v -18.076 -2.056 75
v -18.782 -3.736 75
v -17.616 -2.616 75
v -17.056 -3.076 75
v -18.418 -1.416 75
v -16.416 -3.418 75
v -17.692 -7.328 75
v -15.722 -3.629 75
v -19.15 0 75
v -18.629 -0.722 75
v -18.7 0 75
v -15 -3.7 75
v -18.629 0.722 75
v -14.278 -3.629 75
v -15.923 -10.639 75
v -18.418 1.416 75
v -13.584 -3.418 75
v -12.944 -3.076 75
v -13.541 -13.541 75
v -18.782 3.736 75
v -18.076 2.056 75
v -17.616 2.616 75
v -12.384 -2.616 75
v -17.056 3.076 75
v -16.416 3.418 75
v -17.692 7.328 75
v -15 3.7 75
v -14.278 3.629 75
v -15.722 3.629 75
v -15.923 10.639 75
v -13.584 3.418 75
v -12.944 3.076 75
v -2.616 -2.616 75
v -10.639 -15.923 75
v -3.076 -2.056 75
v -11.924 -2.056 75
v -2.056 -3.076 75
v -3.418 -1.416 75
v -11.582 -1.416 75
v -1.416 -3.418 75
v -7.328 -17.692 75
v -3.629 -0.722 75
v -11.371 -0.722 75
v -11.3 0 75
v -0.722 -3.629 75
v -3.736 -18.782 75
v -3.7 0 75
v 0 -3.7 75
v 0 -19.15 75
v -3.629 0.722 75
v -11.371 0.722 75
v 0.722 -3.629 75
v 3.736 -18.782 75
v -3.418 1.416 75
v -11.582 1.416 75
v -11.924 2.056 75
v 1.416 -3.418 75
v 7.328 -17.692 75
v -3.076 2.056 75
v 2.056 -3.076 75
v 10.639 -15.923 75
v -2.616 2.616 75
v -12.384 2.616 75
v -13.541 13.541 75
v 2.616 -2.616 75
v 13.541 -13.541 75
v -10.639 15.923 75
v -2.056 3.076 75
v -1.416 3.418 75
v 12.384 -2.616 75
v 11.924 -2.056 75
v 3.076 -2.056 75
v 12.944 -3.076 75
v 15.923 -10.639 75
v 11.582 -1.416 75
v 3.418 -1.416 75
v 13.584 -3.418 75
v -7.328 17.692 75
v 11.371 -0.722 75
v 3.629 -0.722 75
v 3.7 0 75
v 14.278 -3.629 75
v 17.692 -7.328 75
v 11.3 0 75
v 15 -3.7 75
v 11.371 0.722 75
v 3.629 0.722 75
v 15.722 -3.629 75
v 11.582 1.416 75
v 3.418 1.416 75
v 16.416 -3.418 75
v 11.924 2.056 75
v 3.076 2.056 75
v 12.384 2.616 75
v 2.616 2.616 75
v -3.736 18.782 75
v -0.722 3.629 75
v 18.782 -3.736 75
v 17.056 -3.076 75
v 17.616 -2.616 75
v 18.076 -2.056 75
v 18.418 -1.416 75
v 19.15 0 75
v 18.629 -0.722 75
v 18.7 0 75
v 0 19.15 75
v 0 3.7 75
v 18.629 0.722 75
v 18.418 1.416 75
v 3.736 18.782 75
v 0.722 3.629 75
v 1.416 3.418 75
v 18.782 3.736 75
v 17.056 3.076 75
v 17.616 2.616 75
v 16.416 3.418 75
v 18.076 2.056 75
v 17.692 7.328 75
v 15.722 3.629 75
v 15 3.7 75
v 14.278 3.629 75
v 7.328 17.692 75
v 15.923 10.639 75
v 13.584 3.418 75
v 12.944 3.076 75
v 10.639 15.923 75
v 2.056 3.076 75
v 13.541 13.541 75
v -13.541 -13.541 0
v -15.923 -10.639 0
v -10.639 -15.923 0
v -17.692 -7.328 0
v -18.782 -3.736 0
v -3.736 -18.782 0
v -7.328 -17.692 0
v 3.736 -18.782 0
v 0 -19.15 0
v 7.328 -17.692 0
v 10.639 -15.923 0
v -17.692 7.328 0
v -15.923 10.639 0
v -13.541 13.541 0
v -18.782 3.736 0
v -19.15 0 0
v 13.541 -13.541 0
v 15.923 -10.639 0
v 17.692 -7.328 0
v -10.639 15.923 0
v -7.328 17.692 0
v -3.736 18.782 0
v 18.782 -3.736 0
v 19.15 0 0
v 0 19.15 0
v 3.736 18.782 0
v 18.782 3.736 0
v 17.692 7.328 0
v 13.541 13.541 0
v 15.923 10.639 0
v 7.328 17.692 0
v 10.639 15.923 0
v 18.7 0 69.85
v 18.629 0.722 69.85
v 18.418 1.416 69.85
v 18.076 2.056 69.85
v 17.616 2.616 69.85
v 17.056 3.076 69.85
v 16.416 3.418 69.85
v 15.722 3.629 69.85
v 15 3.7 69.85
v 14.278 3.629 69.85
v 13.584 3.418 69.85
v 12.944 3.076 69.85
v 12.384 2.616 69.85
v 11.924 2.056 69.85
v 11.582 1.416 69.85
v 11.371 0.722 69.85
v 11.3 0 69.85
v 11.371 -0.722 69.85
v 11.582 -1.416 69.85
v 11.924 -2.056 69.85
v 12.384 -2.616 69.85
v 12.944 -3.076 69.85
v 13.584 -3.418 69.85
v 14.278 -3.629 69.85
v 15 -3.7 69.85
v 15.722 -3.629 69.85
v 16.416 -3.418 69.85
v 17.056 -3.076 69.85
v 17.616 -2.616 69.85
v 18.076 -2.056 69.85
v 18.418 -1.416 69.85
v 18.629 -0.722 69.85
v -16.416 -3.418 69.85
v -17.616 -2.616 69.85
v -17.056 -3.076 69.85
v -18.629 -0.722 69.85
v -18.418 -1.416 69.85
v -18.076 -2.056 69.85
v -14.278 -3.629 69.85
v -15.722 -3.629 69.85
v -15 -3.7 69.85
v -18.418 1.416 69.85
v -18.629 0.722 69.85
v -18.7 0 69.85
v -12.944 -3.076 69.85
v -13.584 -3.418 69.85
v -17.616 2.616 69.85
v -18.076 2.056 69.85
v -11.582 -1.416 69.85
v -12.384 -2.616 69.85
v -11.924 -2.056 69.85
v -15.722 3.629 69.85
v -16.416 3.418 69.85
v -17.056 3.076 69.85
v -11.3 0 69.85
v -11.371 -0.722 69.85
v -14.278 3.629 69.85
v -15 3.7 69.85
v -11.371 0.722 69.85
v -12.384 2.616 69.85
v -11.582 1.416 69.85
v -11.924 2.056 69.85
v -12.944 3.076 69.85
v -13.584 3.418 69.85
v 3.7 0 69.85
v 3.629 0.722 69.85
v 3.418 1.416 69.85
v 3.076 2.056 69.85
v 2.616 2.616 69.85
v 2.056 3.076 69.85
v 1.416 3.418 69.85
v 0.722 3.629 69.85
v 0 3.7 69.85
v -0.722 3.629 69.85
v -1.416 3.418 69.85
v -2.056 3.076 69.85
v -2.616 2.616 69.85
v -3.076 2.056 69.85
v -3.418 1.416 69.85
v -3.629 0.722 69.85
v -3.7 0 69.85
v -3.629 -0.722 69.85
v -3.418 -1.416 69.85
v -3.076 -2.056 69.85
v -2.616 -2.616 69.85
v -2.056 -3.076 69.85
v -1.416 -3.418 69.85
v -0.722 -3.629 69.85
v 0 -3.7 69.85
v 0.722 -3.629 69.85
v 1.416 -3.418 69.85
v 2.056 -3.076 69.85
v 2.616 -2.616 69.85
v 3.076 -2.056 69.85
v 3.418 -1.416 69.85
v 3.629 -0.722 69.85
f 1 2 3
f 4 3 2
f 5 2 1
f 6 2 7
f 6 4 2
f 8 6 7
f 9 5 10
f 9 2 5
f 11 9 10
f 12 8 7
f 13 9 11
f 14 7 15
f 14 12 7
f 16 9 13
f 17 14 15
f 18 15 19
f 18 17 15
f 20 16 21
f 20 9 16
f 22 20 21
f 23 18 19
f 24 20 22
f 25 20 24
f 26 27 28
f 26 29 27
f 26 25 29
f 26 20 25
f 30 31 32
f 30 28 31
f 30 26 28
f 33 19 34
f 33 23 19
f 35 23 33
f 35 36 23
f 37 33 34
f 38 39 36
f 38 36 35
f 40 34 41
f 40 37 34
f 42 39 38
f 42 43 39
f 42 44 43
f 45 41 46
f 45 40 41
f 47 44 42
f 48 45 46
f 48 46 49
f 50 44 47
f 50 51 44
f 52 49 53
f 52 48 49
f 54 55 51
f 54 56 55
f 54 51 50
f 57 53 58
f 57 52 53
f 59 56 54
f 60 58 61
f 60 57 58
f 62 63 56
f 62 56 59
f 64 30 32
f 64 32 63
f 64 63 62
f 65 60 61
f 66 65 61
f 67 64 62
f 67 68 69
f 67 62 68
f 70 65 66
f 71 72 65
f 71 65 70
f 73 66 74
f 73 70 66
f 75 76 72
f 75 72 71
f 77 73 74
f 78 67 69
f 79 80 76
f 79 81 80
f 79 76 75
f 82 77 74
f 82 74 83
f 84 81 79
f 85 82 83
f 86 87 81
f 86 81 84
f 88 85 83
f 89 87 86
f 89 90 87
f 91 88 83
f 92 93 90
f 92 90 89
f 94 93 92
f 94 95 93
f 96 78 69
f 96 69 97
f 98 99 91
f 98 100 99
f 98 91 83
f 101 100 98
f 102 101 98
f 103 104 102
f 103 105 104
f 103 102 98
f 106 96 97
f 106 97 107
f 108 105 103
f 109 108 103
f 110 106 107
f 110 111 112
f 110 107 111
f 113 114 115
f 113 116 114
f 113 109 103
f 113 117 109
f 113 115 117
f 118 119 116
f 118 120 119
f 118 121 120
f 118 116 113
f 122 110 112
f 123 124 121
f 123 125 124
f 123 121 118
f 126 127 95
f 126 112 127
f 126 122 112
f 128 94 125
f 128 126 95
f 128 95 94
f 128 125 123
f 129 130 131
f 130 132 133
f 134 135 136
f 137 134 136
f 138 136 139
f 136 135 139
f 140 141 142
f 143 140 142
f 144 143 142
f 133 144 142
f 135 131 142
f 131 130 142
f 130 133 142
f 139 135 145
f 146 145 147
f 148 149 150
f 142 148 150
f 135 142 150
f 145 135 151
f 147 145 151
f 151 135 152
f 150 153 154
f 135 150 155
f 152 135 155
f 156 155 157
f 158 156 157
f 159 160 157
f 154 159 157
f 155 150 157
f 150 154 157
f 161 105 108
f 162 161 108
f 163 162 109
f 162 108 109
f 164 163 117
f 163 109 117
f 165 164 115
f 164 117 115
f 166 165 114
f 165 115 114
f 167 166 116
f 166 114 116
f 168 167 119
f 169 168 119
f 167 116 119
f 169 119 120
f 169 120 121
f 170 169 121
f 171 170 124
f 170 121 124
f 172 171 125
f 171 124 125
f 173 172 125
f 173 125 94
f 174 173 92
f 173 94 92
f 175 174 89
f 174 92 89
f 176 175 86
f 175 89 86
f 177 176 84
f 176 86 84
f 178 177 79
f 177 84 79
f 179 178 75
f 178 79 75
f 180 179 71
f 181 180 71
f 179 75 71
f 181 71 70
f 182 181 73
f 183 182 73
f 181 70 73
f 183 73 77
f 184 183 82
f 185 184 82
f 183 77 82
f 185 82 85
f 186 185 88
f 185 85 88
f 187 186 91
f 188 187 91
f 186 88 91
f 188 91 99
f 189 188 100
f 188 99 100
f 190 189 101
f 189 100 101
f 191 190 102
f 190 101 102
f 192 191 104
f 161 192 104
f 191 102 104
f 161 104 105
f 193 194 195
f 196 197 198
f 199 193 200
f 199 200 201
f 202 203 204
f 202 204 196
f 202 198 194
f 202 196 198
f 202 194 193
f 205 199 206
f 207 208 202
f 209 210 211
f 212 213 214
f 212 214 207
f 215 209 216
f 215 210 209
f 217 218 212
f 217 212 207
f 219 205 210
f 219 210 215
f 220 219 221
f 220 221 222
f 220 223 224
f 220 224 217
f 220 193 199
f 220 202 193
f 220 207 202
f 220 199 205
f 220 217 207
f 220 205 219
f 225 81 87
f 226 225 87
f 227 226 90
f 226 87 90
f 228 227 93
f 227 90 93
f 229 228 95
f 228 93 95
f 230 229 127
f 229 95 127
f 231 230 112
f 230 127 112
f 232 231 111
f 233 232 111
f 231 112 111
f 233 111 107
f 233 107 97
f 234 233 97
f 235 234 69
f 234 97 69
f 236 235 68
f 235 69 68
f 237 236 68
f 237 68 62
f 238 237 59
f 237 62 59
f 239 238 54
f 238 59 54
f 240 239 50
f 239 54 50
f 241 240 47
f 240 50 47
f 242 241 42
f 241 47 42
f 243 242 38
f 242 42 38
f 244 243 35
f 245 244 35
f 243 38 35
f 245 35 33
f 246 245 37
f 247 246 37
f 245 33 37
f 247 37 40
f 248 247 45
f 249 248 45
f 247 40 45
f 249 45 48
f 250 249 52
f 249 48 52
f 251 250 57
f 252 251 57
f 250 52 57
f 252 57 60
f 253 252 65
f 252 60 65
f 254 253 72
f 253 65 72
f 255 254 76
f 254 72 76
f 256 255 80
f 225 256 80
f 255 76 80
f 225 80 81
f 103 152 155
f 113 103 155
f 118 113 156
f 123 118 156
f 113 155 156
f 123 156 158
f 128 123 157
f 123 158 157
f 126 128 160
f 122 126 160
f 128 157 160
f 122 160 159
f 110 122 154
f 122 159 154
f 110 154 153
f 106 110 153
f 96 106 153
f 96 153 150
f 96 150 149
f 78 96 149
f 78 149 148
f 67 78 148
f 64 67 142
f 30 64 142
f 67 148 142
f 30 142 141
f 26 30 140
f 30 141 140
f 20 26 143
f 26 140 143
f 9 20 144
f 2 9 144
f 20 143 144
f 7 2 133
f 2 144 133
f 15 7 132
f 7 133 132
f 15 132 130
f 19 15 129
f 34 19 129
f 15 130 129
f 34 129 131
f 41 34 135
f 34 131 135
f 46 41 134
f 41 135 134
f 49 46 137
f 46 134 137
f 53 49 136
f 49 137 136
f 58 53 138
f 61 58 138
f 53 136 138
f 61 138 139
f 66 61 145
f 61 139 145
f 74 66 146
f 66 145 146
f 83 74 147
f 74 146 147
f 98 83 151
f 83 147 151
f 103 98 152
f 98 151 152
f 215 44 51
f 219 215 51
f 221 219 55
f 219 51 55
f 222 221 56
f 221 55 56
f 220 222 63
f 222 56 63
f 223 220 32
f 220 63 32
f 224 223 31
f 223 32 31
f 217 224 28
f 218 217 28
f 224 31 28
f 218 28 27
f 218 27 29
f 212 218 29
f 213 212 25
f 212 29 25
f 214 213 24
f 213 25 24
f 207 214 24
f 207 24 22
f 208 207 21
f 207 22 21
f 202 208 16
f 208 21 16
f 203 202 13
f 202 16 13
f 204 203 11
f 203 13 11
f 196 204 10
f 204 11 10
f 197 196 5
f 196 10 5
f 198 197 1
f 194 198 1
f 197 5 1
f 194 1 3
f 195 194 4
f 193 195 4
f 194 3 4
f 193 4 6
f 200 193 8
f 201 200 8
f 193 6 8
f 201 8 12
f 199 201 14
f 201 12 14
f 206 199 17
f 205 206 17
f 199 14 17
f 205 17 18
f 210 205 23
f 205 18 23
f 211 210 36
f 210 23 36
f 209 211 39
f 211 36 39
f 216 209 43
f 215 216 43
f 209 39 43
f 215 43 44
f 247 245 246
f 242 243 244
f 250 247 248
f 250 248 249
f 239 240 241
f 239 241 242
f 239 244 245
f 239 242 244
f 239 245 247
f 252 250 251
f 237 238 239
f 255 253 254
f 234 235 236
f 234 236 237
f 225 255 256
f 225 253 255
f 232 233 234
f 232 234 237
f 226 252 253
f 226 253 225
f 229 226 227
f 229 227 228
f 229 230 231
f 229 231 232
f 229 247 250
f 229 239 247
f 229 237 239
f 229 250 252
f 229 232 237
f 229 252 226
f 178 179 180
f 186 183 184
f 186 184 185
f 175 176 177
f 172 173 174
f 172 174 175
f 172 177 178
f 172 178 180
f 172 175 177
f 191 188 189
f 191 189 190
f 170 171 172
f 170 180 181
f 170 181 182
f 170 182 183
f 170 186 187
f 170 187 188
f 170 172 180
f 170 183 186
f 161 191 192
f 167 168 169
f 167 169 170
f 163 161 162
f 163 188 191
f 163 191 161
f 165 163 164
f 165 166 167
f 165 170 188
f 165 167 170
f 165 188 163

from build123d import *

# Parameters (mm, degrees)
SKETCH6_R           = 19.15
BOSS_EXTRUDE3_DEPTH = 75
SKETCH9_R           = 3.7
CUT_EXTRUDE2_DEPTH  = 5.15


with BuildPart() as part:
    # Sketch6 → Boss-Extrude3 (new body)
    with BuildSketch(Plane.XY):
        Circle(SKETCH6_R)
    extrude(amount=BOSS_EXTRUDE3_DEPTH)

    # Sketch9 → Cut-Extrude2 (cut)
    with BuildSketch(Plane.XY.offset(75)):
        Circle(SKETCH9_R)
        with Locations((-15, 0)):
            Circle(SKETCH9_R)
        with Locations((15, 0)):
            Circle(SKETCH9_R)
    extrude(amount=-CUT_EXTRUDE2_DEPTH, mode=Mode.SUBTRACT)


solid = part.part
